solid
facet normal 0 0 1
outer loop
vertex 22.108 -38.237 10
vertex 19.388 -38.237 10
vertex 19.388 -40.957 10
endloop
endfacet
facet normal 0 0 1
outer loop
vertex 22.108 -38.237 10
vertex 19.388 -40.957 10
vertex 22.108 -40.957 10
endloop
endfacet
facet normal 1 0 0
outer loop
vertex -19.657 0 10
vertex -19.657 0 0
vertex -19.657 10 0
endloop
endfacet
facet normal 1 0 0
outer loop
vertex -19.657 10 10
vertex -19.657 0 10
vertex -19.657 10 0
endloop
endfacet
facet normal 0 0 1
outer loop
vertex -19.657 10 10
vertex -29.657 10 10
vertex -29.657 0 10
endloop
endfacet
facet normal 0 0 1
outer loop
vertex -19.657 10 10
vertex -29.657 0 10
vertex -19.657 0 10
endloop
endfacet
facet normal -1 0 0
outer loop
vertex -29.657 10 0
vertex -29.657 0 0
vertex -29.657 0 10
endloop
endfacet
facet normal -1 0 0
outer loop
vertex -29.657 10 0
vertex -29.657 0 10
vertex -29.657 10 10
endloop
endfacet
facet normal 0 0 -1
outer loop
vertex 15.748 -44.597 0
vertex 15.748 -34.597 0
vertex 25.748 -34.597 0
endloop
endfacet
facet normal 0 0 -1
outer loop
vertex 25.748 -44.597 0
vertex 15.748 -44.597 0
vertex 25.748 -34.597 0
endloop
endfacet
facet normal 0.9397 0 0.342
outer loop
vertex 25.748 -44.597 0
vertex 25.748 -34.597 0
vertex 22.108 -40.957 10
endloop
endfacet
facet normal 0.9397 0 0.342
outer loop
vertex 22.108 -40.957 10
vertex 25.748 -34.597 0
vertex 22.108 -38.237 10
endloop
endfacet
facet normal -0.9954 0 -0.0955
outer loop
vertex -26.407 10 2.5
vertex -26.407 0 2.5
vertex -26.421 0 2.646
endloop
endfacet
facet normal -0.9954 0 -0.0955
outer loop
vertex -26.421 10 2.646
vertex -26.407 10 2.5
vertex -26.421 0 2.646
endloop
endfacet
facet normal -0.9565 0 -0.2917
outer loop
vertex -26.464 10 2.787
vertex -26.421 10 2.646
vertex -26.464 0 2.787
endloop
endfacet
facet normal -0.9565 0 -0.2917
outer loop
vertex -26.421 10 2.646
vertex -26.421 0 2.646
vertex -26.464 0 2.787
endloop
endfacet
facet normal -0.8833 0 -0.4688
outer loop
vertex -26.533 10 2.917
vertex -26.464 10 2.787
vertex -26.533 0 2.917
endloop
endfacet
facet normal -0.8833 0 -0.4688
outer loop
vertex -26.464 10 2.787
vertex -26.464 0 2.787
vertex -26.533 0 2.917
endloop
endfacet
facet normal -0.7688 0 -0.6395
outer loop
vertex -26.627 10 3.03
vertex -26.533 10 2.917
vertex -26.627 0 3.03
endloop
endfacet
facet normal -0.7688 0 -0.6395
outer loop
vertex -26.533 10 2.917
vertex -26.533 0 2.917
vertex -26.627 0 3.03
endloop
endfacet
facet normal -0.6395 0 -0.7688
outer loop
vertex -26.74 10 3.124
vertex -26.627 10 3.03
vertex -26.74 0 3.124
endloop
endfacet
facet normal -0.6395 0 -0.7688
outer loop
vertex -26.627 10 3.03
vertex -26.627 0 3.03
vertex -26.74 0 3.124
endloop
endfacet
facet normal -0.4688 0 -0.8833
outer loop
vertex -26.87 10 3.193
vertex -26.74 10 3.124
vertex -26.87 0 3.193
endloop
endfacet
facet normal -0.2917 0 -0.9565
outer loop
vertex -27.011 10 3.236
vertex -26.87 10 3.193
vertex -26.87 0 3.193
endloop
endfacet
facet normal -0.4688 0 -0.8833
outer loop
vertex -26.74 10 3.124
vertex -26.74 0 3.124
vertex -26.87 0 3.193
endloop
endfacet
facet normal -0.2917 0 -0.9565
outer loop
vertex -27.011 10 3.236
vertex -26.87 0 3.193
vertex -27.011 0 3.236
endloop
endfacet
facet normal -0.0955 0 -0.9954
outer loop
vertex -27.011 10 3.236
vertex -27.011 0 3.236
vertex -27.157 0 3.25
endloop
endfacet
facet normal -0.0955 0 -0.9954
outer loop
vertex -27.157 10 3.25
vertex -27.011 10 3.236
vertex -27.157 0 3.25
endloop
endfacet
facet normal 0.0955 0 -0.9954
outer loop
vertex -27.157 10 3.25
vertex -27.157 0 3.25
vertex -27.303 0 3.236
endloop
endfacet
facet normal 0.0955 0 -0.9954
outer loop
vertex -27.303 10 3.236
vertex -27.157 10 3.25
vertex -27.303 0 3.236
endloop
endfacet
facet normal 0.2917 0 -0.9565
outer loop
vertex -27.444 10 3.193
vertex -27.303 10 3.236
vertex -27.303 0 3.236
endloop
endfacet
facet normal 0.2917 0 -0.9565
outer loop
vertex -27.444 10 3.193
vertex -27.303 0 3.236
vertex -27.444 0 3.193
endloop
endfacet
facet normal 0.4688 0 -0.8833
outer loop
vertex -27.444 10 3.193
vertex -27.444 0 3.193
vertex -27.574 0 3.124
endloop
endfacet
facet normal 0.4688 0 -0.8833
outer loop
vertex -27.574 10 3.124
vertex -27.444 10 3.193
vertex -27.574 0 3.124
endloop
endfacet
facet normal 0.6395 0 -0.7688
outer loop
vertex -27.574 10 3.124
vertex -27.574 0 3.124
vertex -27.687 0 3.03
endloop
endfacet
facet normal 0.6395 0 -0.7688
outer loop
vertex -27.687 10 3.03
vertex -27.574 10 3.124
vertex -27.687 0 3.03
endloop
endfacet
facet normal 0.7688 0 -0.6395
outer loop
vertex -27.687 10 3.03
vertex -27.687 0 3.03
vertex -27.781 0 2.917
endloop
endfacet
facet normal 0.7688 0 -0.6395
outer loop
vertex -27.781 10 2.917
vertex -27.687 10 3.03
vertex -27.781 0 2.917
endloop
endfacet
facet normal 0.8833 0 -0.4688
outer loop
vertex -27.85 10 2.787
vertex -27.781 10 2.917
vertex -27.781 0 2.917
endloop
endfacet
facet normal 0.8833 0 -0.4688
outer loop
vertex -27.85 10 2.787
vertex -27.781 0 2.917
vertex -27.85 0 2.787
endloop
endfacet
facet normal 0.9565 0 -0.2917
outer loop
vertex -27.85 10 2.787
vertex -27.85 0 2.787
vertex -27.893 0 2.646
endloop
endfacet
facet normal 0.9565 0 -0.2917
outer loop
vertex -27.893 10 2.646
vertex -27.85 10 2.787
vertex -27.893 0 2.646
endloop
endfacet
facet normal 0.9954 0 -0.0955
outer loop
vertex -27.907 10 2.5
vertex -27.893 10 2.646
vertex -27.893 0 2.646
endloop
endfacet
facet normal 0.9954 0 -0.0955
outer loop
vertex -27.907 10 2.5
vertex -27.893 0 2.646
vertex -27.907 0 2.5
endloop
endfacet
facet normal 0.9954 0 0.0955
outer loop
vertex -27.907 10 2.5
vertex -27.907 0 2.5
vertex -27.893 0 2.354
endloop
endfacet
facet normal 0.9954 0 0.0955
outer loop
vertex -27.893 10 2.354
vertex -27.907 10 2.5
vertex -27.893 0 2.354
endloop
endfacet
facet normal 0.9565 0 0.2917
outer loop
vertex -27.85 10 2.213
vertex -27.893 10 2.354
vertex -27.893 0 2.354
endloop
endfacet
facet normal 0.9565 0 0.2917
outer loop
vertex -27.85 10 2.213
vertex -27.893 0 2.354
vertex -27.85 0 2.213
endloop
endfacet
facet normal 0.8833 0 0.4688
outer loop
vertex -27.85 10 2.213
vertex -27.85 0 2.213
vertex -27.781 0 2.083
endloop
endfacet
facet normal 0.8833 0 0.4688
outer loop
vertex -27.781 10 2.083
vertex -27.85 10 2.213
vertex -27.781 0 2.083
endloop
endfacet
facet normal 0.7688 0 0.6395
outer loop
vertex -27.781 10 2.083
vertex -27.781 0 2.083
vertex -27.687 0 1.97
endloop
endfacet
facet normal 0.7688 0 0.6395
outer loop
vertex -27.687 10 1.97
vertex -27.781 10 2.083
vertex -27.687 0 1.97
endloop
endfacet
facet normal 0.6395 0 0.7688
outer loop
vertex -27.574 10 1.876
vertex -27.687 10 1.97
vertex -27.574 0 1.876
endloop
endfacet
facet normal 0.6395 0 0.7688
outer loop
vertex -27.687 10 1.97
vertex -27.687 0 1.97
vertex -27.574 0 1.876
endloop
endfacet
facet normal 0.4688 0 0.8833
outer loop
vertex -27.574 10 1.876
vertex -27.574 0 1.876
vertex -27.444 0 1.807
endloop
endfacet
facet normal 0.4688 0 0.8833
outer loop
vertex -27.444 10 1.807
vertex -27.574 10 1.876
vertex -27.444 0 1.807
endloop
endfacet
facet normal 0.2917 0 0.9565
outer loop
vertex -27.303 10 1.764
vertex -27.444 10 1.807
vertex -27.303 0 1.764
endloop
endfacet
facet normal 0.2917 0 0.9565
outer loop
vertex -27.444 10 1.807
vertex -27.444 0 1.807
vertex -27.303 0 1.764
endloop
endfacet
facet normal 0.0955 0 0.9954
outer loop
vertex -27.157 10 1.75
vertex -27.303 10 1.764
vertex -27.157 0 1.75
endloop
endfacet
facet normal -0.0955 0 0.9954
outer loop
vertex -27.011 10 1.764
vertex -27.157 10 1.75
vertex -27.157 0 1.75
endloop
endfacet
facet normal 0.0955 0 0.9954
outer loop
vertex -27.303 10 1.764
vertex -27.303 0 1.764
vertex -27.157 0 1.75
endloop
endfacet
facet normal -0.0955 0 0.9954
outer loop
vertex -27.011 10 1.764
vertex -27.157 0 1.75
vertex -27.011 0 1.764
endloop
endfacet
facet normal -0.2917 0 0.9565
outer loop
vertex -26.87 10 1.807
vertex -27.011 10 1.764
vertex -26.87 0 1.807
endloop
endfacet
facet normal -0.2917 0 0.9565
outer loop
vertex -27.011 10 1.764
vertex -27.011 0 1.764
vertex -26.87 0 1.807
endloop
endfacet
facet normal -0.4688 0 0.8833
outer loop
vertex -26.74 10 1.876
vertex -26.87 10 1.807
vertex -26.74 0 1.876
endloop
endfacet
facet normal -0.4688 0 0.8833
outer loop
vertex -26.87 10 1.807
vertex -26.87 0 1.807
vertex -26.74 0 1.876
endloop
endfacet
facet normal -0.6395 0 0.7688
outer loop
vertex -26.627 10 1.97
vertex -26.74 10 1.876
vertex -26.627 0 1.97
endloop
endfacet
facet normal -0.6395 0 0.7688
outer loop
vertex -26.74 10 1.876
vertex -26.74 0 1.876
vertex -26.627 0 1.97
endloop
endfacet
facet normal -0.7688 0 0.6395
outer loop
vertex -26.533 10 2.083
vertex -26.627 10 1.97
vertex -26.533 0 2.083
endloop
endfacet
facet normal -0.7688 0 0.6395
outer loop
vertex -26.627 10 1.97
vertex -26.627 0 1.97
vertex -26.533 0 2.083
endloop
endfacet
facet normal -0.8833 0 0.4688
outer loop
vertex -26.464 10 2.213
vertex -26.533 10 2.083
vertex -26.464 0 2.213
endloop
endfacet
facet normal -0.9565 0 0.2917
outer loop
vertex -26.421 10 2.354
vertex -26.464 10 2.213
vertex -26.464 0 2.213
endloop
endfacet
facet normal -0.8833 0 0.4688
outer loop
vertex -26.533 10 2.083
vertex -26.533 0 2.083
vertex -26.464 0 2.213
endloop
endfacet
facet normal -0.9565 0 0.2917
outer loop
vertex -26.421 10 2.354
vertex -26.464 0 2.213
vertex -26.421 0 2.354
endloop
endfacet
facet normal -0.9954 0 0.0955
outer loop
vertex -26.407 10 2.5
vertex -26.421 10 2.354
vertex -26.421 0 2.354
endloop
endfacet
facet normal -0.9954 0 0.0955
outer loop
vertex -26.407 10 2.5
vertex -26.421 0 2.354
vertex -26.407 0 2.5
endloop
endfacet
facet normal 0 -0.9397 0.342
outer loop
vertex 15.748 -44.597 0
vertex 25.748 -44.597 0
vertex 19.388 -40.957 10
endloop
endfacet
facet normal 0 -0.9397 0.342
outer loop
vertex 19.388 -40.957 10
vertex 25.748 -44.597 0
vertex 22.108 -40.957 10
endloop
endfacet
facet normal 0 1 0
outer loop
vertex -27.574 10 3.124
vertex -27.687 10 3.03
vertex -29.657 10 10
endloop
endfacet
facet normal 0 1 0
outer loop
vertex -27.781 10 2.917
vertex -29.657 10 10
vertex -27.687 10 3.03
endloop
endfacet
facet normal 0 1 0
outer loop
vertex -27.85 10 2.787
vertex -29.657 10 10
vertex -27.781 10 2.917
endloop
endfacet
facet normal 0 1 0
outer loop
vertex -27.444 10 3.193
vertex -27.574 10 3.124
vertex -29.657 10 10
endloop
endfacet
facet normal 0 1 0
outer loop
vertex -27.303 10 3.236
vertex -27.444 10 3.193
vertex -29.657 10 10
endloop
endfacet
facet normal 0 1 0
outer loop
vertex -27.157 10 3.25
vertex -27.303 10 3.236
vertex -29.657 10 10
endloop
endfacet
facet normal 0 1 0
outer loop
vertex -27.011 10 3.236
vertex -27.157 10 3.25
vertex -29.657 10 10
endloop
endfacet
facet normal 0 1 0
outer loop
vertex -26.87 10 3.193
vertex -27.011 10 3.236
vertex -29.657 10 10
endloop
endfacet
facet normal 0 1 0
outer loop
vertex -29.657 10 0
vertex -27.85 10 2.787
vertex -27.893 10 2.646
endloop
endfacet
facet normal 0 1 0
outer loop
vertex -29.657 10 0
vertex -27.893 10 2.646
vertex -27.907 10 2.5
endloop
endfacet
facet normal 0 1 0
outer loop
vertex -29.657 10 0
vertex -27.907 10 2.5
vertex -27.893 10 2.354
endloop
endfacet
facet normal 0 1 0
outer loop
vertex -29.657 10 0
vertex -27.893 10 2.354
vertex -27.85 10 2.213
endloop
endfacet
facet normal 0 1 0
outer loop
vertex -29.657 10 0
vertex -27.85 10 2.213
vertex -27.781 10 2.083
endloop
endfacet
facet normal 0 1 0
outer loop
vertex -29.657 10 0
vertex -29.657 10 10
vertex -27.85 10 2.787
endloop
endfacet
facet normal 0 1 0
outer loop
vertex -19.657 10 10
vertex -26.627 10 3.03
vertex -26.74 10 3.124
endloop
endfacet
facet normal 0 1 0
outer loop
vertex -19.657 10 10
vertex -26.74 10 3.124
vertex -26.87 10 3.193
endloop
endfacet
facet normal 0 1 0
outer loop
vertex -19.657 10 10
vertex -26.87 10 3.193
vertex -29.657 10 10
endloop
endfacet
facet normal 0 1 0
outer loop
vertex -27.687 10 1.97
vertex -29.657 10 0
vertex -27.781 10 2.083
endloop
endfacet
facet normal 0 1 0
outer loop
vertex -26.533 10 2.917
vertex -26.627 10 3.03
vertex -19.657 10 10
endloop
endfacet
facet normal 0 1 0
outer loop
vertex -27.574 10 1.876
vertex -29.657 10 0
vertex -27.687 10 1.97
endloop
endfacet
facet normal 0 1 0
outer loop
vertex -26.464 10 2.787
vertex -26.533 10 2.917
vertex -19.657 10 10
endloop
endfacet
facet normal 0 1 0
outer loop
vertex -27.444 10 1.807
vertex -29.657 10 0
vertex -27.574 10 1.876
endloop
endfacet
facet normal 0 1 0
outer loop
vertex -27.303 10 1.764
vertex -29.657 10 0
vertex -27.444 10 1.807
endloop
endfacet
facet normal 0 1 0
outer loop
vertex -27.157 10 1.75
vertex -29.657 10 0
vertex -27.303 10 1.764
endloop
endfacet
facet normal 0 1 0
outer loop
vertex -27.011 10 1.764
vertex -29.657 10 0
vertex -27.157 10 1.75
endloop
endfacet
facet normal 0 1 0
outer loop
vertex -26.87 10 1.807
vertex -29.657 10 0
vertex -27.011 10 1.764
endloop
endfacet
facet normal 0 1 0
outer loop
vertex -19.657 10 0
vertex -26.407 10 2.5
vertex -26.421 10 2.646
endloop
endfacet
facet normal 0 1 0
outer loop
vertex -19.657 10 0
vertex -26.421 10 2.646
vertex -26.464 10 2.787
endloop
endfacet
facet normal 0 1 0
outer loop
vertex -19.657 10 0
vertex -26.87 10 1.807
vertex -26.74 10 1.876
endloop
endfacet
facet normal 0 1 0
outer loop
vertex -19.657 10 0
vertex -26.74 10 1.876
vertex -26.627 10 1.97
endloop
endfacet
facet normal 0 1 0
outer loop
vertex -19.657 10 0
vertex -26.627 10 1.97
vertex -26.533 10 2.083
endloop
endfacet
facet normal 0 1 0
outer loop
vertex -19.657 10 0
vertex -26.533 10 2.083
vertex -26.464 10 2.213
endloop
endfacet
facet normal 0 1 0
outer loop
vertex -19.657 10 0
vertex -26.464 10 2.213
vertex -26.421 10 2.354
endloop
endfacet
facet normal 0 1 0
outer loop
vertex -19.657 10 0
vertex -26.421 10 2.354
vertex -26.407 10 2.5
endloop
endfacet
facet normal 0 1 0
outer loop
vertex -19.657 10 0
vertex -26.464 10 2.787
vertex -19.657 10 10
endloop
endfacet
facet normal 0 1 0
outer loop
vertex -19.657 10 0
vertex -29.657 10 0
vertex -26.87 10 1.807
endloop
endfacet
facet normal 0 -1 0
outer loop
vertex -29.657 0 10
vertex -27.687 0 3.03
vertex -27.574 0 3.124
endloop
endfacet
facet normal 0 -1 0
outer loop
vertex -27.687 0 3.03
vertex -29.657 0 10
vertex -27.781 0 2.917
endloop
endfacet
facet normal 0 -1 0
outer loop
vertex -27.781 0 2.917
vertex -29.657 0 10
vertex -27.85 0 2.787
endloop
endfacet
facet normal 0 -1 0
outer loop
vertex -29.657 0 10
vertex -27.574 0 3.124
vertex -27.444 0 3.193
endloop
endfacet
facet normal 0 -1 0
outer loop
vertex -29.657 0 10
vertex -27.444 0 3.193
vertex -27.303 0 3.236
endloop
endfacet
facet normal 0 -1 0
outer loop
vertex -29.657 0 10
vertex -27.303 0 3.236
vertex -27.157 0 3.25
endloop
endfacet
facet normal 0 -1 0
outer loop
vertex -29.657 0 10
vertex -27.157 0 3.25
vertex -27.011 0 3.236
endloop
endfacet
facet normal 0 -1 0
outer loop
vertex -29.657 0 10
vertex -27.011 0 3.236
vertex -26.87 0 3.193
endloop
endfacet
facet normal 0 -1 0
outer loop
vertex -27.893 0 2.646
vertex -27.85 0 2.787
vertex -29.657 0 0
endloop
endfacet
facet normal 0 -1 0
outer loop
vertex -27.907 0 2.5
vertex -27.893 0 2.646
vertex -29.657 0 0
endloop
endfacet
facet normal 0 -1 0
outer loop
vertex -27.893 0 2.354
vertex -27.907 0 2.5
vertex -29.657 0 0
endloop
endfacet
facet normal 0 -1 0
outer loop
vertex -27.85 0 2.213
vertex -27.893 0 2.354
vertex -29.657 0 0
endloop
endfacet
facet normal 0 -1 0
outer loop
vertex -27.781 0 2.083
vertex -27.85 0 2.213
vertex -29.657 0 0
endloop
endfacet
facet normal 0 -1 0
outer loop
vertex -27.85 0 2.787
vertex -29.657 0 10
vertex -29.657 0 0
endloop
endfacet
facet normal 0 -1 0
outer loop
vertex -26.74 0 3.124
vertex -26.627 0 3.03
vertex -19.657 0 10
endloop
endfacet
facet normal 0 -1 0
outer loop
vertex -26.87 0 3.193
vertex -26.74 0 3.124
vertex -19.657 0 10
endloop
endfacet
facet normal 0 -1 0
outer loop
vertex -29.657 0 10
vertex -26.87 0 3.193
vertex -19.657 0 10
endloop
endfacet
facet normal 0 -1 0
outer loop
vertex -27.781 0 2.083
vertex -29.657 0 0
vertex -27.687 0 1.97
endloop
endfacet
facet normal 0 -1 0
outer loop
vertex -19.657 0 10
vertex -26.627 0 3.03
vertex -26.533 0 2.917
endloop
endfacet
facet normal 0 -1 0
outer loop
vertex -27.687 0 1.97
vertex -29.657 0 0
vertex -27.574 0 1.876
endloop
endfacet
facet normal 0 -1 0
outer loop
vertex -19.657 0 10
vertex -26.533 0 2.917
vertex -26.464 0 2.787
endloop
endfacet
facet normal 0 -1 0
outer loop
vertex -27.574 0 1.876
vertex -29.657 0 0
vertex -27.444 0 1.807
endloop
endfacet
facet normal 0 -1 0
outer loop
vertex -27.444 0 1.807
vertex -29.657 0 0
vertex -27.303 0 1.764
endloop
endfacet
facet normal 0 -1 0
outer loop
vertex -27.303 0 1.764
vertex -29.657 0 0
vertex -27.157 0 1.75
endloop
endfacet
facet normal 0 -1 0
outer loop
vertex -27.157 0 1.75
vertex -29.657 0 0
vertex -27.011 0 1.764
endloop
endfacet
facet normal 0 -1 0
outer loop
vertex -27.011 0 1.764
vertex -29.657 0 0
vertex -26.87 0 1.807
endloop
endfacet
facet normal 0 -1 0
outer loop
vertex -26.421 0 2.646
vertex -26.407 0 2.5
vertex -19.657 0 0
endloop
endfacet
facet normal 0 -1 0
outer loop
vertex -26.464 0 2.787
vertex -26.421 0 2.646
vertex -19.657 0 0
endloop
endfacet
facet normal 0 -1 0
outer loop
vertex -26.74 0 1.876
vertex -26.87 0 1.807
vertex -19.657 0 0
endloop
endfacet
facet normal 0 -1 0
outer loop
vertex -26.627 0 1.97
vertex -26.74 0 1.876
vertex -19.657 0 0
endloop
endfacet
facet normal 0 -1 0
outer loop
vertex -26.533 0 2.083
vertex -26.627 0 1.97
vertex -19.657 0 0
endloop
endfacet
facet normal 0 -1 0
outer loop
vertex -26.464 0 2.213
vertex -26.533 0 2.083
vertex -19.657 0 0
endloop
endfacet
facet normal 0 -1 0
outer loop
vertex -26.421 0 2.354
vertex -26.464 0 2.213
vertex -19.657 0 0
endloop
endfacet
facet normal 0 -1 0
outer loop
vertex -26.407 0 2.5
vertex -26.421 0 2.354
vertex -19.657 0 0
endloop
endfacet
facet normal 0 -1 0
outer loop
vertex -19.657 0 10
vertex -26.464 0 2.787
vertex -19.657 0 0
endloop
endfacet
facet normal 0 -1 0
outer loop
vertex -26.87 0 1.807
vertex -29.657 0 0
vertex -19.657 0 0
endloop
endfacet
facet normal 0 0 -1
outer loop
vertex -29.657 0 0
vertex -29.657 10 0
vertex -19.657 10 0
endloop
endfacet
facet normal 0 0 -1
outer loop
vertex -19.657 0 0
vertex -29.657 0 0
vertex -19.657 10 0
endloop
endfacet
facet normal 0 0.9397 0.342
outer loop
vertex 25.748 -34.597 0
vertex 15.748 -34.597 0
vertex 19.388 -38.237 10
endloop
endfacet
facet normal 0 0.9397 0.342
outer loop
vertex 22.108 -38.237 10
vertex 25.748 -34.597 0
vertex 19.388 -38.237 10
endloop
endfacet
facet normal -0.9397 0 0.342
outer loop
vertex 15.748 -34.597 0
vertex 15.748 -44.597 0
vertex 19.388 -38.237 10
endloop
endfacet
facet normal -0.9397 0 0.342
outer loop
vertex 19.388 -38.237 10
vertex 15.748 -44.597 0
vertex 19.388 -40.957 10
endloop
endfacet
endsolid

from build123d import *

# Parameters (mm, degrees)
F0_W     = 10
F0_H     = 10
F1_DEPTH = 10
F2_W     = 10
F2_H     = 10
F3_DEPTH = 10
F3_TAPER = 20
F4_R     = 0.75
F5_DEPTH = 25


with BuildPart() as f1:
    # F0 (on Top) → F1 (new body)
    with BuildSketch(Plane.XY):
        with Locations((-24.6569485217, 5)):
            Rectangle(F0_W, F0_H)
    extrude(amount=F1_DEPTH)

    # F4 (on face) → F5 (cut)
    with BuildSketch(Plane.XZ):
        with Locations((-27.1569485217, 2.5)):
            Circle(F4_R)
    extrude(amount=-F5_DEPTH, mode=Mode.SUBTRACT)


with BuildPart() as f3:
    # F2 (on Top) → F3 (new body)
    with BuildSketch(Plane.XY):
        with Locations((20.7480721921, -39.5969700813)):
            Rectangle(F2_W, F2_H)
    extrude(amount=F3_DEPTH, taper=F3_TAPER)


solid = Compound([f1.part, f3.part])
